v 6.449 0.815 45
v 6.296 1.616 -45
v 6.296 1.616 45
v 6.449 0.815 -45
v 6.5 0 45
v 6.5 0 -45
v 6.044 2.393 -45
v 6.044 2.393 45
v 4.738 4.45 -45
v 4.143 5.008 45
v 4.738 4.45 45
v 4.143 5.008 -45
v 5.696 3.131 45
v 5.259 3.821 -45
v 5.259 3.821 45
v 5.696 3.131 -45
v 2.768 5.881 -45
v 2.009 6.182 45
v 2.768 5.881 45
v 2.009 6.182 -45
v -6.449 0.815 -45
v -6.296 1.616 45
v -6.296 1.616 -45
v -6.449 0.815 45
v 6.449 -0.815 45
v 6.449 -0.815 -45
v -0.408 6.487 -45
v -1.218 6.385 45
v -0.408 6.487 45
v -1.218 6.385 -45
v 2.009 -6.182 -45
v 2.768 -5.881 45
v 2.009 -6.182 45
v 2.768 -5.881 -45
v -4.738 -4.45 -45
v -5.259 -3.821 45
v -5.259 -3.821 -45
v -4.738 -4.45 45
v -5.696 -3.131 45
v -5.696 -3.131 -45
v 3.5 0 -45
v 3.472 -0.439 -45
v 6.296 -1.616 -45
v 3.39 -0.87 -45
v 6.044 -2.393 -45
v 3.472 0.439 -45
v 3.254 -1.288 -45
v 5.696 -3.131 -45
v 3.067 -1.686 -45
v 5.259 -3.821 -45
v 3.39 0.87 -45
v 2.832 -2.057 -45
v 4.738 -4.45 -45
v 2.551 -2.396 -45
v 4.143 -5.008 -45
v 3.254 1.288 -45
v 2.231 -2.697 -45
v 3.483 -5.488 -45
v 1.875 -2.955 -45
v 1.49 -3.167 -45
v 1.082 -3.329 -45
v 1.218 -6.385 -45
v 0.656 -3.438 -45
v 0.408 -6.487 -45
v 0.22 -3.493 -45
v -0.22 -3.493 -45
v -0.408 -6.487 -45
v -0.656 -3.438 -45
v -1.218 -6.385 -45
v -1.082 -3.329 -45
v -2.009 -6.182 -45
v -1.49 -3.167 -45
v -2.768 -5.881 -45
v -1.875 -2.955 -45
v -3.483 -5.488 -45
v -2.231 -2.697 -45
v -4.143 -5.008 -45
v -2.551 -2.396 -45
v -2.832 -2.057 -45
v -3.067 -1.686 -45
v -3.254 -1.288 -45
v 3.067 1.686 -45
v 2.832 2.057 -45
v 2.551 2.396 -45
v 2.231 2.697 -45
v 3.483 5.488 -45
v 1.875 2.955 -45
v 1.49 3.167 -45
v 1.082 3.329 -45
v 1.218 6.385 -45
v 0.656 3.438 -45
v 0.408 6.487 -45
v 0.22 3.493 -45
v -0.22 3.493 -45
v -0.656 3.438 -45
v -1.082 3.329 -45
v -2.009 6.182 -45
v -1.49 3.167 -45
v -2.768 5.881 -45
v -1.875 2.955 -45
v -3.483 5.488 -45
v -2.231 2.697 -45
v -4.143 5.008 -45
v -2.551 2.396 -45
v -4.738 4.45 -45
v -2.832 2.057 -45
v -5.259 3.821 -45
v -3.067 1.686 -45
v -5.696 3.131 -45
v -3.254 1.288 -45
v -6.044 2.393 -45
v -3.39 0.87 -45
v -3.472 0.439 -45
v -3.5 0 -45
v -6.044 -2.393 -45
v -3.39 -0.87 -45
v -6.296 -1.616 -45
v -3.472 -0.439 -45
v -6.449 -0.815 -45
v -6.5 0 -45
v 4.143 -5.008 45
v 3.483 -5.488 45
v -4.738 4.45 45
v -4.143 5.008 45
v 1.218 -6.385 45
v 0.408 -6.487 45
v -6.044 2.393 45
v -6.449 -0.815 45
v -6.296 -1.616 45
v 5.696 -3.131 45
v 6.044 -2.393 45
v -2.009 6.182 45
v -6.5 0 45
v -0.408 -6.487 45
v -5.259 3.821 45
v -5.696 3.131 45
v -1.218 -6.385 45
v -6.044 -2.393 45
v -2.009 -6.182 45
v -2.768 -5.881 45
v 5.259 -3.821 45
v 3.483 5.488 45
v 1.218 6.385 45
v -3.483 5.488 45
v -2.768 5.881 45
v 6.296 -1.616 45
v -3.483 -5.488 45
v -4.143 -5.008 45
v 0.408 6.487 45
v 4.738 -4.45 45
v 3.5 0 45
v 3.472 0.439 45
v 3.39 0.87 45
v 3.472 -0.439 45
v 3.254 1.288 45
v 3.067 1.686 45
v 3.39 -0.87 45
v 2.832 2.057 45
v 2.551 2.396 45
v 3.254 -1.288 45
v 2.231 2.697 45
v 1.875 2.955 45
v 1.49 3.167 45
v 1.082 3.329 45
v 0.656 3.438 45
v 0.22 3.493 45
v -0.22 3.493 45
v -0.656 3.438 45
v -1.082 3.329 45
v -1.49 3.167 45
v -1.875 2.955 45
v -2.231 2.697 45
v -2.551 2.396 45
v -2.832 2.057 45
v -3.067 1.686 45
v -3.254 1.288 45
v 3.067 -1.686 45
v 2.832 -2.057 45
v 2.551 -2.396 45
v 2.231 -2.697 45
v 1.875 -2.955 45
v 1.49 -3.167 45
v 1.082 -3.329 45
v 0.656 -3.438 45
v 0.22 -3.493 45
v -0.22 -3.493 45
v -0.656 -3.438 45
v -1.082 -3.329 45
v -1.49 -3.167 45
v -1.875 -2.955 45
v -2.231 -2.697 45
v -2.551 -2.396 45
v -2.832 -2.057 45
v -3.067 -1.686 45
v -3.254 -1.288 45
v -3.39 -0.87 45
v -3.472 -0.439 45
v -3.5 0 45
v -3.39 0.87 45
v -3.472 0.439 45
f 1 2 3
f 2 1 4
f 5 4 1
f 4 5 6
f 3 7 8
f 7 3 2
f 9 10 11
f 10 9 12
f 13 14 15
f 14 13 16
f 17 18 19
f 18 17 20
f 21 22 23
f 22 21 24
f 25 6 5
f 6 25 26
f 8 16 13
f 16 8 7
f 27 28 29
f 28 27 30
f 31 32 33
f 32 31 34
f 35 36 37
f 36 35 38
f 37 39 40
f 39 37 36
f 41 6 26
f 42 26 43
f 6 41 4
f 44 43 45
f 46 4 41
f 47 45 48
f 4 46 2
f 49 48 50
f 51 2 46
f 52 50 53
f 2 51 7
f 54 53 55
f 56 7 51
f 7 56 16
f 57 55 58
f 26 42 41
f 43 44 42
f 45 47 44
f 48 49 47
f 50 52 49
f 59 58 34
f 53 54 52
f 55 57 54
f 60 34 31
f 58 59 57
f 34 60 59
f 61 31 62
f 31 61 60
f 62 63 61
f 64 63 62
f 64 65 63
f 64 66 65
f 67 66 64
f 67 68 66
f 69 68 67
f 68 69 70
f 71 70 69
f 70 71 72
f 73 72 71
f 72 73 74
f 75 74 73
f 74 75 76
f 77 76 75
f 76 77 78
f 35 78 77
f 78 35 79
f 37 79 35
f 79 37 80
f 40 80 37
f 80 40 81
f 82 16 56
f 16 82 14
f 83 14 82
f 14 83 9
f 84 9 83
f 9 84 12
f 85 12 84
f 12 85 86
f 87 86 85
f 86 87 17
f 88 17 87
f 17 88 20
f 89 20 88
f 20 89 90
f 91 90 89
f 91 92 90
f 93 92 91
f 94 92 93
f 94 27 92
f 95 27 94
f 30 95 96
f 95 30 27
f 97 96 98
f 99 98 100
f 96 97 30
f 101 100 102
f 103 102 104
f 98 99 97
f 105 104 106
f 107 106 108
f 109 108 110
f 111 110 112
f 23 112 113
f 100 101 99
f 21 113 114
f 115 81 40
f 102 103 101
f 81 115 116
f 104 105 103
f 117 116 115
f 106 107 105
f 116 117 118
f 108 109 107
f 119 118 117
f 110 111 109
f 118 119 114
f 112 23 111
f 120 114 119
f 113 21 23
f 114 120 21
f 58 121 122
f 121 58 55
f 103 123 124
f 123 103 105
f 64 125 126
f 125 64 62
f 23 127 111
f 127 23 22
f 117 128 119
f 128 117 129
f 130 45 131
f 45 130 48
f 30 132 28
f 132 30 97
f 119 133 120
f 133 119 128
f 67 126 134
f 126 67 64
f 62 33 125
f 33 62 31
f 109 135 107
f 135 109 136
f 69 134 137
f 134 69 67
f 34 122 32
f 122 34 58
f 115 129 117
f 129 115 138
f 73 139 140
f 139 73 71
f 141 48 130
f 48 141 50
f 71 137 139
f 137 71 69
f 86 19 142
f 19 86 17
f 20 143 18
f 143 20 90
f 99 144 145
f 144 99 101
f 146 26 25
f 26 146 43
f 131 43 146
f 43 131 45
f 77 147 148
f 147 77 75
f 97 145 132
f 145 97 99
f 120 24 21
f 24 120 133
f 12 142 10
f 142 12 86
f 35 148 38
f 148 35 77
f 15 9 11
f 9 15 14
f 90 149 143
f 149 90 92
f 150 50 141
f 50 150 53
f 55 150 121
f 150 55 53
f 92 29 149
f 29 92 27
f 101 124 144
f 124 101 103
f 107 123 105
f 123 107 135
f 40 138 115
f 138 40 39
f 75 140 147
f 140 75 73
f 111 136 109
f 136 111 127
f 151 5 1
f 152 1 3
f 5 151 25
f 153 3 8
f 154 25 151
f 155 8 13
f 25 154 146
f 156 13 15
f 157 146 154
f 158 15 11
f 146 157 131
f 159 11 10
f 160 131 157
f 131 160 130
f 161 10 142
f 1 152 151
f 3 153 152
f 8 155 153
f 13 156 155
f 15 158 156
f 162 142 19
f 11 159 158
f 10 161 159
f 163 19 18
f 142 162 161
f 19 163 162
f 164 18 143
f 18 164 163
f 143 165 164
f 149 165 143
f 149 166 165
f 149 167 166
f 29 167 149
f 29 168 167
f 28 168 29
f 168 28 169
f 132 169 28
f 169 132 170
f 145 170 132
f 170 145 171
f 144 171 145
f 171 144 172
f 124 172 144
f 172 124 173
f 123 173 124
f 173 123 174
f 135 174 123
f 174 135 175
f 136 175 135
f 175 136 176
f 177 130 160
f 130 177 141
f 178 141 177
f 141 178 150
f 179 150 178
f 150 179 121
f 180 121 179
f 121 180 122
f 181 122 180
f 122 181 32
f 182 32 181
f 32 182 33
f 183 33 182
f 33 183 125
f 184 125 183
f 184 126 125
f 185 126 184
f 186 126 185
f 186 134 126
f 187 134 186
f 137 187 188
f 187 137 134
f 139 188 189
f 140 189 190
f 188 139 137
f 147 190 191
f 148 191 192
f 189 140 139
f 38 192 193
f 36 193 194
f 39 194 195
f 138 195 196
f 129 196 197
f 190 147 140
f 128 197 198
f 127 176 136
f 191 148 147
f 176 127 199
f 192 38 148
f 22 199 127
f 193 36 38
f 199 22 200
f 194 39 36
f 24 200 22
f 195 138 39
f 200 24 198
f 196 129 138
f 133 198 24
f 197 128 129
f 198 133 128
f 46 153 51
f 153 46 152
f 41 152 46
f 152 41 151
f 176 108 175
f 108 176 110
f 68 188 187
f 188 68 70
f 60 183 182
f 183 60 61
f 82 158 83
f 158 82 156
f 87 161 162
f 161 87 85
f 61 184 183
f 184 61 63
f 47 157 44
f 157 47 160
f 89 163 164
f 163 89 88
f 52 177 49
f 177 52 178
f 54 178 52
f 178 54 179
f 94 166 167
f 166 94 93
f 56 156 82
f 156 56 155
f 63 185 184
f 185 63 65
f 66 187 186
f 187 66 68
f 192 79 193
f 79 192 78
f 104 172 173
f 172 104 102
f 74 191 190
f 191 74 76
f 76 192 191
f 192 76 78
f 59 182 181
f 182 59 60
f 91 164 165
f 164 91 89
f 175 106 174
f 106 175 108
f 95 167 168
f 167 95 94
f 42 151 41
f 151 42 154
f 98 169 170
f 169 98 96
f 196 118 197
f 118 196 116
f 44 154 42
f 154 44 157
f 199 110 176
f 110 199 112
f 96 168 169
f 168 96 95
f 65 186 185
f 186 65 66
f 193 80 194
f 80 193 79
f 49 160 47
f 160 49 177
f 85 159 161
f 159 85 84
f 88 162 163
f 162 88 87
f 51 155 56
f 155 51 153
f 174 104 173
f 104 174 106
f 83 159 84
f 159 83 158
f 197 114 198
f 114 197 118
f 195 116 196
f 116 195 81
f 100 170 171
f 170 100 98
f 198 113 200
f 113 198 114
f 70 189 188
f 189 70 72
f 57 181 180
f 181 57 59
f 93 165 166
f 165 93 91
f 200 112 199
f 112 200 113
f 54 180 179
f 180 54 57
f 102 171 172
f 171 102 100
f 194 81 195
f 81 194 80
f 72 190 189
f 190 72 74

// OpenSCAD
$fn = 50;


difference() {
	union() {
		translate(v = [0, 0, -45.0000000000]) {
			cylinder(h = 90, r = 6.5000000000);
		}
	}
	union() {
		translate(v = [0, 0, -100.0000000000]) {
			cylinder(h = 200, r = 3.5000000000);
		}
	}
}
